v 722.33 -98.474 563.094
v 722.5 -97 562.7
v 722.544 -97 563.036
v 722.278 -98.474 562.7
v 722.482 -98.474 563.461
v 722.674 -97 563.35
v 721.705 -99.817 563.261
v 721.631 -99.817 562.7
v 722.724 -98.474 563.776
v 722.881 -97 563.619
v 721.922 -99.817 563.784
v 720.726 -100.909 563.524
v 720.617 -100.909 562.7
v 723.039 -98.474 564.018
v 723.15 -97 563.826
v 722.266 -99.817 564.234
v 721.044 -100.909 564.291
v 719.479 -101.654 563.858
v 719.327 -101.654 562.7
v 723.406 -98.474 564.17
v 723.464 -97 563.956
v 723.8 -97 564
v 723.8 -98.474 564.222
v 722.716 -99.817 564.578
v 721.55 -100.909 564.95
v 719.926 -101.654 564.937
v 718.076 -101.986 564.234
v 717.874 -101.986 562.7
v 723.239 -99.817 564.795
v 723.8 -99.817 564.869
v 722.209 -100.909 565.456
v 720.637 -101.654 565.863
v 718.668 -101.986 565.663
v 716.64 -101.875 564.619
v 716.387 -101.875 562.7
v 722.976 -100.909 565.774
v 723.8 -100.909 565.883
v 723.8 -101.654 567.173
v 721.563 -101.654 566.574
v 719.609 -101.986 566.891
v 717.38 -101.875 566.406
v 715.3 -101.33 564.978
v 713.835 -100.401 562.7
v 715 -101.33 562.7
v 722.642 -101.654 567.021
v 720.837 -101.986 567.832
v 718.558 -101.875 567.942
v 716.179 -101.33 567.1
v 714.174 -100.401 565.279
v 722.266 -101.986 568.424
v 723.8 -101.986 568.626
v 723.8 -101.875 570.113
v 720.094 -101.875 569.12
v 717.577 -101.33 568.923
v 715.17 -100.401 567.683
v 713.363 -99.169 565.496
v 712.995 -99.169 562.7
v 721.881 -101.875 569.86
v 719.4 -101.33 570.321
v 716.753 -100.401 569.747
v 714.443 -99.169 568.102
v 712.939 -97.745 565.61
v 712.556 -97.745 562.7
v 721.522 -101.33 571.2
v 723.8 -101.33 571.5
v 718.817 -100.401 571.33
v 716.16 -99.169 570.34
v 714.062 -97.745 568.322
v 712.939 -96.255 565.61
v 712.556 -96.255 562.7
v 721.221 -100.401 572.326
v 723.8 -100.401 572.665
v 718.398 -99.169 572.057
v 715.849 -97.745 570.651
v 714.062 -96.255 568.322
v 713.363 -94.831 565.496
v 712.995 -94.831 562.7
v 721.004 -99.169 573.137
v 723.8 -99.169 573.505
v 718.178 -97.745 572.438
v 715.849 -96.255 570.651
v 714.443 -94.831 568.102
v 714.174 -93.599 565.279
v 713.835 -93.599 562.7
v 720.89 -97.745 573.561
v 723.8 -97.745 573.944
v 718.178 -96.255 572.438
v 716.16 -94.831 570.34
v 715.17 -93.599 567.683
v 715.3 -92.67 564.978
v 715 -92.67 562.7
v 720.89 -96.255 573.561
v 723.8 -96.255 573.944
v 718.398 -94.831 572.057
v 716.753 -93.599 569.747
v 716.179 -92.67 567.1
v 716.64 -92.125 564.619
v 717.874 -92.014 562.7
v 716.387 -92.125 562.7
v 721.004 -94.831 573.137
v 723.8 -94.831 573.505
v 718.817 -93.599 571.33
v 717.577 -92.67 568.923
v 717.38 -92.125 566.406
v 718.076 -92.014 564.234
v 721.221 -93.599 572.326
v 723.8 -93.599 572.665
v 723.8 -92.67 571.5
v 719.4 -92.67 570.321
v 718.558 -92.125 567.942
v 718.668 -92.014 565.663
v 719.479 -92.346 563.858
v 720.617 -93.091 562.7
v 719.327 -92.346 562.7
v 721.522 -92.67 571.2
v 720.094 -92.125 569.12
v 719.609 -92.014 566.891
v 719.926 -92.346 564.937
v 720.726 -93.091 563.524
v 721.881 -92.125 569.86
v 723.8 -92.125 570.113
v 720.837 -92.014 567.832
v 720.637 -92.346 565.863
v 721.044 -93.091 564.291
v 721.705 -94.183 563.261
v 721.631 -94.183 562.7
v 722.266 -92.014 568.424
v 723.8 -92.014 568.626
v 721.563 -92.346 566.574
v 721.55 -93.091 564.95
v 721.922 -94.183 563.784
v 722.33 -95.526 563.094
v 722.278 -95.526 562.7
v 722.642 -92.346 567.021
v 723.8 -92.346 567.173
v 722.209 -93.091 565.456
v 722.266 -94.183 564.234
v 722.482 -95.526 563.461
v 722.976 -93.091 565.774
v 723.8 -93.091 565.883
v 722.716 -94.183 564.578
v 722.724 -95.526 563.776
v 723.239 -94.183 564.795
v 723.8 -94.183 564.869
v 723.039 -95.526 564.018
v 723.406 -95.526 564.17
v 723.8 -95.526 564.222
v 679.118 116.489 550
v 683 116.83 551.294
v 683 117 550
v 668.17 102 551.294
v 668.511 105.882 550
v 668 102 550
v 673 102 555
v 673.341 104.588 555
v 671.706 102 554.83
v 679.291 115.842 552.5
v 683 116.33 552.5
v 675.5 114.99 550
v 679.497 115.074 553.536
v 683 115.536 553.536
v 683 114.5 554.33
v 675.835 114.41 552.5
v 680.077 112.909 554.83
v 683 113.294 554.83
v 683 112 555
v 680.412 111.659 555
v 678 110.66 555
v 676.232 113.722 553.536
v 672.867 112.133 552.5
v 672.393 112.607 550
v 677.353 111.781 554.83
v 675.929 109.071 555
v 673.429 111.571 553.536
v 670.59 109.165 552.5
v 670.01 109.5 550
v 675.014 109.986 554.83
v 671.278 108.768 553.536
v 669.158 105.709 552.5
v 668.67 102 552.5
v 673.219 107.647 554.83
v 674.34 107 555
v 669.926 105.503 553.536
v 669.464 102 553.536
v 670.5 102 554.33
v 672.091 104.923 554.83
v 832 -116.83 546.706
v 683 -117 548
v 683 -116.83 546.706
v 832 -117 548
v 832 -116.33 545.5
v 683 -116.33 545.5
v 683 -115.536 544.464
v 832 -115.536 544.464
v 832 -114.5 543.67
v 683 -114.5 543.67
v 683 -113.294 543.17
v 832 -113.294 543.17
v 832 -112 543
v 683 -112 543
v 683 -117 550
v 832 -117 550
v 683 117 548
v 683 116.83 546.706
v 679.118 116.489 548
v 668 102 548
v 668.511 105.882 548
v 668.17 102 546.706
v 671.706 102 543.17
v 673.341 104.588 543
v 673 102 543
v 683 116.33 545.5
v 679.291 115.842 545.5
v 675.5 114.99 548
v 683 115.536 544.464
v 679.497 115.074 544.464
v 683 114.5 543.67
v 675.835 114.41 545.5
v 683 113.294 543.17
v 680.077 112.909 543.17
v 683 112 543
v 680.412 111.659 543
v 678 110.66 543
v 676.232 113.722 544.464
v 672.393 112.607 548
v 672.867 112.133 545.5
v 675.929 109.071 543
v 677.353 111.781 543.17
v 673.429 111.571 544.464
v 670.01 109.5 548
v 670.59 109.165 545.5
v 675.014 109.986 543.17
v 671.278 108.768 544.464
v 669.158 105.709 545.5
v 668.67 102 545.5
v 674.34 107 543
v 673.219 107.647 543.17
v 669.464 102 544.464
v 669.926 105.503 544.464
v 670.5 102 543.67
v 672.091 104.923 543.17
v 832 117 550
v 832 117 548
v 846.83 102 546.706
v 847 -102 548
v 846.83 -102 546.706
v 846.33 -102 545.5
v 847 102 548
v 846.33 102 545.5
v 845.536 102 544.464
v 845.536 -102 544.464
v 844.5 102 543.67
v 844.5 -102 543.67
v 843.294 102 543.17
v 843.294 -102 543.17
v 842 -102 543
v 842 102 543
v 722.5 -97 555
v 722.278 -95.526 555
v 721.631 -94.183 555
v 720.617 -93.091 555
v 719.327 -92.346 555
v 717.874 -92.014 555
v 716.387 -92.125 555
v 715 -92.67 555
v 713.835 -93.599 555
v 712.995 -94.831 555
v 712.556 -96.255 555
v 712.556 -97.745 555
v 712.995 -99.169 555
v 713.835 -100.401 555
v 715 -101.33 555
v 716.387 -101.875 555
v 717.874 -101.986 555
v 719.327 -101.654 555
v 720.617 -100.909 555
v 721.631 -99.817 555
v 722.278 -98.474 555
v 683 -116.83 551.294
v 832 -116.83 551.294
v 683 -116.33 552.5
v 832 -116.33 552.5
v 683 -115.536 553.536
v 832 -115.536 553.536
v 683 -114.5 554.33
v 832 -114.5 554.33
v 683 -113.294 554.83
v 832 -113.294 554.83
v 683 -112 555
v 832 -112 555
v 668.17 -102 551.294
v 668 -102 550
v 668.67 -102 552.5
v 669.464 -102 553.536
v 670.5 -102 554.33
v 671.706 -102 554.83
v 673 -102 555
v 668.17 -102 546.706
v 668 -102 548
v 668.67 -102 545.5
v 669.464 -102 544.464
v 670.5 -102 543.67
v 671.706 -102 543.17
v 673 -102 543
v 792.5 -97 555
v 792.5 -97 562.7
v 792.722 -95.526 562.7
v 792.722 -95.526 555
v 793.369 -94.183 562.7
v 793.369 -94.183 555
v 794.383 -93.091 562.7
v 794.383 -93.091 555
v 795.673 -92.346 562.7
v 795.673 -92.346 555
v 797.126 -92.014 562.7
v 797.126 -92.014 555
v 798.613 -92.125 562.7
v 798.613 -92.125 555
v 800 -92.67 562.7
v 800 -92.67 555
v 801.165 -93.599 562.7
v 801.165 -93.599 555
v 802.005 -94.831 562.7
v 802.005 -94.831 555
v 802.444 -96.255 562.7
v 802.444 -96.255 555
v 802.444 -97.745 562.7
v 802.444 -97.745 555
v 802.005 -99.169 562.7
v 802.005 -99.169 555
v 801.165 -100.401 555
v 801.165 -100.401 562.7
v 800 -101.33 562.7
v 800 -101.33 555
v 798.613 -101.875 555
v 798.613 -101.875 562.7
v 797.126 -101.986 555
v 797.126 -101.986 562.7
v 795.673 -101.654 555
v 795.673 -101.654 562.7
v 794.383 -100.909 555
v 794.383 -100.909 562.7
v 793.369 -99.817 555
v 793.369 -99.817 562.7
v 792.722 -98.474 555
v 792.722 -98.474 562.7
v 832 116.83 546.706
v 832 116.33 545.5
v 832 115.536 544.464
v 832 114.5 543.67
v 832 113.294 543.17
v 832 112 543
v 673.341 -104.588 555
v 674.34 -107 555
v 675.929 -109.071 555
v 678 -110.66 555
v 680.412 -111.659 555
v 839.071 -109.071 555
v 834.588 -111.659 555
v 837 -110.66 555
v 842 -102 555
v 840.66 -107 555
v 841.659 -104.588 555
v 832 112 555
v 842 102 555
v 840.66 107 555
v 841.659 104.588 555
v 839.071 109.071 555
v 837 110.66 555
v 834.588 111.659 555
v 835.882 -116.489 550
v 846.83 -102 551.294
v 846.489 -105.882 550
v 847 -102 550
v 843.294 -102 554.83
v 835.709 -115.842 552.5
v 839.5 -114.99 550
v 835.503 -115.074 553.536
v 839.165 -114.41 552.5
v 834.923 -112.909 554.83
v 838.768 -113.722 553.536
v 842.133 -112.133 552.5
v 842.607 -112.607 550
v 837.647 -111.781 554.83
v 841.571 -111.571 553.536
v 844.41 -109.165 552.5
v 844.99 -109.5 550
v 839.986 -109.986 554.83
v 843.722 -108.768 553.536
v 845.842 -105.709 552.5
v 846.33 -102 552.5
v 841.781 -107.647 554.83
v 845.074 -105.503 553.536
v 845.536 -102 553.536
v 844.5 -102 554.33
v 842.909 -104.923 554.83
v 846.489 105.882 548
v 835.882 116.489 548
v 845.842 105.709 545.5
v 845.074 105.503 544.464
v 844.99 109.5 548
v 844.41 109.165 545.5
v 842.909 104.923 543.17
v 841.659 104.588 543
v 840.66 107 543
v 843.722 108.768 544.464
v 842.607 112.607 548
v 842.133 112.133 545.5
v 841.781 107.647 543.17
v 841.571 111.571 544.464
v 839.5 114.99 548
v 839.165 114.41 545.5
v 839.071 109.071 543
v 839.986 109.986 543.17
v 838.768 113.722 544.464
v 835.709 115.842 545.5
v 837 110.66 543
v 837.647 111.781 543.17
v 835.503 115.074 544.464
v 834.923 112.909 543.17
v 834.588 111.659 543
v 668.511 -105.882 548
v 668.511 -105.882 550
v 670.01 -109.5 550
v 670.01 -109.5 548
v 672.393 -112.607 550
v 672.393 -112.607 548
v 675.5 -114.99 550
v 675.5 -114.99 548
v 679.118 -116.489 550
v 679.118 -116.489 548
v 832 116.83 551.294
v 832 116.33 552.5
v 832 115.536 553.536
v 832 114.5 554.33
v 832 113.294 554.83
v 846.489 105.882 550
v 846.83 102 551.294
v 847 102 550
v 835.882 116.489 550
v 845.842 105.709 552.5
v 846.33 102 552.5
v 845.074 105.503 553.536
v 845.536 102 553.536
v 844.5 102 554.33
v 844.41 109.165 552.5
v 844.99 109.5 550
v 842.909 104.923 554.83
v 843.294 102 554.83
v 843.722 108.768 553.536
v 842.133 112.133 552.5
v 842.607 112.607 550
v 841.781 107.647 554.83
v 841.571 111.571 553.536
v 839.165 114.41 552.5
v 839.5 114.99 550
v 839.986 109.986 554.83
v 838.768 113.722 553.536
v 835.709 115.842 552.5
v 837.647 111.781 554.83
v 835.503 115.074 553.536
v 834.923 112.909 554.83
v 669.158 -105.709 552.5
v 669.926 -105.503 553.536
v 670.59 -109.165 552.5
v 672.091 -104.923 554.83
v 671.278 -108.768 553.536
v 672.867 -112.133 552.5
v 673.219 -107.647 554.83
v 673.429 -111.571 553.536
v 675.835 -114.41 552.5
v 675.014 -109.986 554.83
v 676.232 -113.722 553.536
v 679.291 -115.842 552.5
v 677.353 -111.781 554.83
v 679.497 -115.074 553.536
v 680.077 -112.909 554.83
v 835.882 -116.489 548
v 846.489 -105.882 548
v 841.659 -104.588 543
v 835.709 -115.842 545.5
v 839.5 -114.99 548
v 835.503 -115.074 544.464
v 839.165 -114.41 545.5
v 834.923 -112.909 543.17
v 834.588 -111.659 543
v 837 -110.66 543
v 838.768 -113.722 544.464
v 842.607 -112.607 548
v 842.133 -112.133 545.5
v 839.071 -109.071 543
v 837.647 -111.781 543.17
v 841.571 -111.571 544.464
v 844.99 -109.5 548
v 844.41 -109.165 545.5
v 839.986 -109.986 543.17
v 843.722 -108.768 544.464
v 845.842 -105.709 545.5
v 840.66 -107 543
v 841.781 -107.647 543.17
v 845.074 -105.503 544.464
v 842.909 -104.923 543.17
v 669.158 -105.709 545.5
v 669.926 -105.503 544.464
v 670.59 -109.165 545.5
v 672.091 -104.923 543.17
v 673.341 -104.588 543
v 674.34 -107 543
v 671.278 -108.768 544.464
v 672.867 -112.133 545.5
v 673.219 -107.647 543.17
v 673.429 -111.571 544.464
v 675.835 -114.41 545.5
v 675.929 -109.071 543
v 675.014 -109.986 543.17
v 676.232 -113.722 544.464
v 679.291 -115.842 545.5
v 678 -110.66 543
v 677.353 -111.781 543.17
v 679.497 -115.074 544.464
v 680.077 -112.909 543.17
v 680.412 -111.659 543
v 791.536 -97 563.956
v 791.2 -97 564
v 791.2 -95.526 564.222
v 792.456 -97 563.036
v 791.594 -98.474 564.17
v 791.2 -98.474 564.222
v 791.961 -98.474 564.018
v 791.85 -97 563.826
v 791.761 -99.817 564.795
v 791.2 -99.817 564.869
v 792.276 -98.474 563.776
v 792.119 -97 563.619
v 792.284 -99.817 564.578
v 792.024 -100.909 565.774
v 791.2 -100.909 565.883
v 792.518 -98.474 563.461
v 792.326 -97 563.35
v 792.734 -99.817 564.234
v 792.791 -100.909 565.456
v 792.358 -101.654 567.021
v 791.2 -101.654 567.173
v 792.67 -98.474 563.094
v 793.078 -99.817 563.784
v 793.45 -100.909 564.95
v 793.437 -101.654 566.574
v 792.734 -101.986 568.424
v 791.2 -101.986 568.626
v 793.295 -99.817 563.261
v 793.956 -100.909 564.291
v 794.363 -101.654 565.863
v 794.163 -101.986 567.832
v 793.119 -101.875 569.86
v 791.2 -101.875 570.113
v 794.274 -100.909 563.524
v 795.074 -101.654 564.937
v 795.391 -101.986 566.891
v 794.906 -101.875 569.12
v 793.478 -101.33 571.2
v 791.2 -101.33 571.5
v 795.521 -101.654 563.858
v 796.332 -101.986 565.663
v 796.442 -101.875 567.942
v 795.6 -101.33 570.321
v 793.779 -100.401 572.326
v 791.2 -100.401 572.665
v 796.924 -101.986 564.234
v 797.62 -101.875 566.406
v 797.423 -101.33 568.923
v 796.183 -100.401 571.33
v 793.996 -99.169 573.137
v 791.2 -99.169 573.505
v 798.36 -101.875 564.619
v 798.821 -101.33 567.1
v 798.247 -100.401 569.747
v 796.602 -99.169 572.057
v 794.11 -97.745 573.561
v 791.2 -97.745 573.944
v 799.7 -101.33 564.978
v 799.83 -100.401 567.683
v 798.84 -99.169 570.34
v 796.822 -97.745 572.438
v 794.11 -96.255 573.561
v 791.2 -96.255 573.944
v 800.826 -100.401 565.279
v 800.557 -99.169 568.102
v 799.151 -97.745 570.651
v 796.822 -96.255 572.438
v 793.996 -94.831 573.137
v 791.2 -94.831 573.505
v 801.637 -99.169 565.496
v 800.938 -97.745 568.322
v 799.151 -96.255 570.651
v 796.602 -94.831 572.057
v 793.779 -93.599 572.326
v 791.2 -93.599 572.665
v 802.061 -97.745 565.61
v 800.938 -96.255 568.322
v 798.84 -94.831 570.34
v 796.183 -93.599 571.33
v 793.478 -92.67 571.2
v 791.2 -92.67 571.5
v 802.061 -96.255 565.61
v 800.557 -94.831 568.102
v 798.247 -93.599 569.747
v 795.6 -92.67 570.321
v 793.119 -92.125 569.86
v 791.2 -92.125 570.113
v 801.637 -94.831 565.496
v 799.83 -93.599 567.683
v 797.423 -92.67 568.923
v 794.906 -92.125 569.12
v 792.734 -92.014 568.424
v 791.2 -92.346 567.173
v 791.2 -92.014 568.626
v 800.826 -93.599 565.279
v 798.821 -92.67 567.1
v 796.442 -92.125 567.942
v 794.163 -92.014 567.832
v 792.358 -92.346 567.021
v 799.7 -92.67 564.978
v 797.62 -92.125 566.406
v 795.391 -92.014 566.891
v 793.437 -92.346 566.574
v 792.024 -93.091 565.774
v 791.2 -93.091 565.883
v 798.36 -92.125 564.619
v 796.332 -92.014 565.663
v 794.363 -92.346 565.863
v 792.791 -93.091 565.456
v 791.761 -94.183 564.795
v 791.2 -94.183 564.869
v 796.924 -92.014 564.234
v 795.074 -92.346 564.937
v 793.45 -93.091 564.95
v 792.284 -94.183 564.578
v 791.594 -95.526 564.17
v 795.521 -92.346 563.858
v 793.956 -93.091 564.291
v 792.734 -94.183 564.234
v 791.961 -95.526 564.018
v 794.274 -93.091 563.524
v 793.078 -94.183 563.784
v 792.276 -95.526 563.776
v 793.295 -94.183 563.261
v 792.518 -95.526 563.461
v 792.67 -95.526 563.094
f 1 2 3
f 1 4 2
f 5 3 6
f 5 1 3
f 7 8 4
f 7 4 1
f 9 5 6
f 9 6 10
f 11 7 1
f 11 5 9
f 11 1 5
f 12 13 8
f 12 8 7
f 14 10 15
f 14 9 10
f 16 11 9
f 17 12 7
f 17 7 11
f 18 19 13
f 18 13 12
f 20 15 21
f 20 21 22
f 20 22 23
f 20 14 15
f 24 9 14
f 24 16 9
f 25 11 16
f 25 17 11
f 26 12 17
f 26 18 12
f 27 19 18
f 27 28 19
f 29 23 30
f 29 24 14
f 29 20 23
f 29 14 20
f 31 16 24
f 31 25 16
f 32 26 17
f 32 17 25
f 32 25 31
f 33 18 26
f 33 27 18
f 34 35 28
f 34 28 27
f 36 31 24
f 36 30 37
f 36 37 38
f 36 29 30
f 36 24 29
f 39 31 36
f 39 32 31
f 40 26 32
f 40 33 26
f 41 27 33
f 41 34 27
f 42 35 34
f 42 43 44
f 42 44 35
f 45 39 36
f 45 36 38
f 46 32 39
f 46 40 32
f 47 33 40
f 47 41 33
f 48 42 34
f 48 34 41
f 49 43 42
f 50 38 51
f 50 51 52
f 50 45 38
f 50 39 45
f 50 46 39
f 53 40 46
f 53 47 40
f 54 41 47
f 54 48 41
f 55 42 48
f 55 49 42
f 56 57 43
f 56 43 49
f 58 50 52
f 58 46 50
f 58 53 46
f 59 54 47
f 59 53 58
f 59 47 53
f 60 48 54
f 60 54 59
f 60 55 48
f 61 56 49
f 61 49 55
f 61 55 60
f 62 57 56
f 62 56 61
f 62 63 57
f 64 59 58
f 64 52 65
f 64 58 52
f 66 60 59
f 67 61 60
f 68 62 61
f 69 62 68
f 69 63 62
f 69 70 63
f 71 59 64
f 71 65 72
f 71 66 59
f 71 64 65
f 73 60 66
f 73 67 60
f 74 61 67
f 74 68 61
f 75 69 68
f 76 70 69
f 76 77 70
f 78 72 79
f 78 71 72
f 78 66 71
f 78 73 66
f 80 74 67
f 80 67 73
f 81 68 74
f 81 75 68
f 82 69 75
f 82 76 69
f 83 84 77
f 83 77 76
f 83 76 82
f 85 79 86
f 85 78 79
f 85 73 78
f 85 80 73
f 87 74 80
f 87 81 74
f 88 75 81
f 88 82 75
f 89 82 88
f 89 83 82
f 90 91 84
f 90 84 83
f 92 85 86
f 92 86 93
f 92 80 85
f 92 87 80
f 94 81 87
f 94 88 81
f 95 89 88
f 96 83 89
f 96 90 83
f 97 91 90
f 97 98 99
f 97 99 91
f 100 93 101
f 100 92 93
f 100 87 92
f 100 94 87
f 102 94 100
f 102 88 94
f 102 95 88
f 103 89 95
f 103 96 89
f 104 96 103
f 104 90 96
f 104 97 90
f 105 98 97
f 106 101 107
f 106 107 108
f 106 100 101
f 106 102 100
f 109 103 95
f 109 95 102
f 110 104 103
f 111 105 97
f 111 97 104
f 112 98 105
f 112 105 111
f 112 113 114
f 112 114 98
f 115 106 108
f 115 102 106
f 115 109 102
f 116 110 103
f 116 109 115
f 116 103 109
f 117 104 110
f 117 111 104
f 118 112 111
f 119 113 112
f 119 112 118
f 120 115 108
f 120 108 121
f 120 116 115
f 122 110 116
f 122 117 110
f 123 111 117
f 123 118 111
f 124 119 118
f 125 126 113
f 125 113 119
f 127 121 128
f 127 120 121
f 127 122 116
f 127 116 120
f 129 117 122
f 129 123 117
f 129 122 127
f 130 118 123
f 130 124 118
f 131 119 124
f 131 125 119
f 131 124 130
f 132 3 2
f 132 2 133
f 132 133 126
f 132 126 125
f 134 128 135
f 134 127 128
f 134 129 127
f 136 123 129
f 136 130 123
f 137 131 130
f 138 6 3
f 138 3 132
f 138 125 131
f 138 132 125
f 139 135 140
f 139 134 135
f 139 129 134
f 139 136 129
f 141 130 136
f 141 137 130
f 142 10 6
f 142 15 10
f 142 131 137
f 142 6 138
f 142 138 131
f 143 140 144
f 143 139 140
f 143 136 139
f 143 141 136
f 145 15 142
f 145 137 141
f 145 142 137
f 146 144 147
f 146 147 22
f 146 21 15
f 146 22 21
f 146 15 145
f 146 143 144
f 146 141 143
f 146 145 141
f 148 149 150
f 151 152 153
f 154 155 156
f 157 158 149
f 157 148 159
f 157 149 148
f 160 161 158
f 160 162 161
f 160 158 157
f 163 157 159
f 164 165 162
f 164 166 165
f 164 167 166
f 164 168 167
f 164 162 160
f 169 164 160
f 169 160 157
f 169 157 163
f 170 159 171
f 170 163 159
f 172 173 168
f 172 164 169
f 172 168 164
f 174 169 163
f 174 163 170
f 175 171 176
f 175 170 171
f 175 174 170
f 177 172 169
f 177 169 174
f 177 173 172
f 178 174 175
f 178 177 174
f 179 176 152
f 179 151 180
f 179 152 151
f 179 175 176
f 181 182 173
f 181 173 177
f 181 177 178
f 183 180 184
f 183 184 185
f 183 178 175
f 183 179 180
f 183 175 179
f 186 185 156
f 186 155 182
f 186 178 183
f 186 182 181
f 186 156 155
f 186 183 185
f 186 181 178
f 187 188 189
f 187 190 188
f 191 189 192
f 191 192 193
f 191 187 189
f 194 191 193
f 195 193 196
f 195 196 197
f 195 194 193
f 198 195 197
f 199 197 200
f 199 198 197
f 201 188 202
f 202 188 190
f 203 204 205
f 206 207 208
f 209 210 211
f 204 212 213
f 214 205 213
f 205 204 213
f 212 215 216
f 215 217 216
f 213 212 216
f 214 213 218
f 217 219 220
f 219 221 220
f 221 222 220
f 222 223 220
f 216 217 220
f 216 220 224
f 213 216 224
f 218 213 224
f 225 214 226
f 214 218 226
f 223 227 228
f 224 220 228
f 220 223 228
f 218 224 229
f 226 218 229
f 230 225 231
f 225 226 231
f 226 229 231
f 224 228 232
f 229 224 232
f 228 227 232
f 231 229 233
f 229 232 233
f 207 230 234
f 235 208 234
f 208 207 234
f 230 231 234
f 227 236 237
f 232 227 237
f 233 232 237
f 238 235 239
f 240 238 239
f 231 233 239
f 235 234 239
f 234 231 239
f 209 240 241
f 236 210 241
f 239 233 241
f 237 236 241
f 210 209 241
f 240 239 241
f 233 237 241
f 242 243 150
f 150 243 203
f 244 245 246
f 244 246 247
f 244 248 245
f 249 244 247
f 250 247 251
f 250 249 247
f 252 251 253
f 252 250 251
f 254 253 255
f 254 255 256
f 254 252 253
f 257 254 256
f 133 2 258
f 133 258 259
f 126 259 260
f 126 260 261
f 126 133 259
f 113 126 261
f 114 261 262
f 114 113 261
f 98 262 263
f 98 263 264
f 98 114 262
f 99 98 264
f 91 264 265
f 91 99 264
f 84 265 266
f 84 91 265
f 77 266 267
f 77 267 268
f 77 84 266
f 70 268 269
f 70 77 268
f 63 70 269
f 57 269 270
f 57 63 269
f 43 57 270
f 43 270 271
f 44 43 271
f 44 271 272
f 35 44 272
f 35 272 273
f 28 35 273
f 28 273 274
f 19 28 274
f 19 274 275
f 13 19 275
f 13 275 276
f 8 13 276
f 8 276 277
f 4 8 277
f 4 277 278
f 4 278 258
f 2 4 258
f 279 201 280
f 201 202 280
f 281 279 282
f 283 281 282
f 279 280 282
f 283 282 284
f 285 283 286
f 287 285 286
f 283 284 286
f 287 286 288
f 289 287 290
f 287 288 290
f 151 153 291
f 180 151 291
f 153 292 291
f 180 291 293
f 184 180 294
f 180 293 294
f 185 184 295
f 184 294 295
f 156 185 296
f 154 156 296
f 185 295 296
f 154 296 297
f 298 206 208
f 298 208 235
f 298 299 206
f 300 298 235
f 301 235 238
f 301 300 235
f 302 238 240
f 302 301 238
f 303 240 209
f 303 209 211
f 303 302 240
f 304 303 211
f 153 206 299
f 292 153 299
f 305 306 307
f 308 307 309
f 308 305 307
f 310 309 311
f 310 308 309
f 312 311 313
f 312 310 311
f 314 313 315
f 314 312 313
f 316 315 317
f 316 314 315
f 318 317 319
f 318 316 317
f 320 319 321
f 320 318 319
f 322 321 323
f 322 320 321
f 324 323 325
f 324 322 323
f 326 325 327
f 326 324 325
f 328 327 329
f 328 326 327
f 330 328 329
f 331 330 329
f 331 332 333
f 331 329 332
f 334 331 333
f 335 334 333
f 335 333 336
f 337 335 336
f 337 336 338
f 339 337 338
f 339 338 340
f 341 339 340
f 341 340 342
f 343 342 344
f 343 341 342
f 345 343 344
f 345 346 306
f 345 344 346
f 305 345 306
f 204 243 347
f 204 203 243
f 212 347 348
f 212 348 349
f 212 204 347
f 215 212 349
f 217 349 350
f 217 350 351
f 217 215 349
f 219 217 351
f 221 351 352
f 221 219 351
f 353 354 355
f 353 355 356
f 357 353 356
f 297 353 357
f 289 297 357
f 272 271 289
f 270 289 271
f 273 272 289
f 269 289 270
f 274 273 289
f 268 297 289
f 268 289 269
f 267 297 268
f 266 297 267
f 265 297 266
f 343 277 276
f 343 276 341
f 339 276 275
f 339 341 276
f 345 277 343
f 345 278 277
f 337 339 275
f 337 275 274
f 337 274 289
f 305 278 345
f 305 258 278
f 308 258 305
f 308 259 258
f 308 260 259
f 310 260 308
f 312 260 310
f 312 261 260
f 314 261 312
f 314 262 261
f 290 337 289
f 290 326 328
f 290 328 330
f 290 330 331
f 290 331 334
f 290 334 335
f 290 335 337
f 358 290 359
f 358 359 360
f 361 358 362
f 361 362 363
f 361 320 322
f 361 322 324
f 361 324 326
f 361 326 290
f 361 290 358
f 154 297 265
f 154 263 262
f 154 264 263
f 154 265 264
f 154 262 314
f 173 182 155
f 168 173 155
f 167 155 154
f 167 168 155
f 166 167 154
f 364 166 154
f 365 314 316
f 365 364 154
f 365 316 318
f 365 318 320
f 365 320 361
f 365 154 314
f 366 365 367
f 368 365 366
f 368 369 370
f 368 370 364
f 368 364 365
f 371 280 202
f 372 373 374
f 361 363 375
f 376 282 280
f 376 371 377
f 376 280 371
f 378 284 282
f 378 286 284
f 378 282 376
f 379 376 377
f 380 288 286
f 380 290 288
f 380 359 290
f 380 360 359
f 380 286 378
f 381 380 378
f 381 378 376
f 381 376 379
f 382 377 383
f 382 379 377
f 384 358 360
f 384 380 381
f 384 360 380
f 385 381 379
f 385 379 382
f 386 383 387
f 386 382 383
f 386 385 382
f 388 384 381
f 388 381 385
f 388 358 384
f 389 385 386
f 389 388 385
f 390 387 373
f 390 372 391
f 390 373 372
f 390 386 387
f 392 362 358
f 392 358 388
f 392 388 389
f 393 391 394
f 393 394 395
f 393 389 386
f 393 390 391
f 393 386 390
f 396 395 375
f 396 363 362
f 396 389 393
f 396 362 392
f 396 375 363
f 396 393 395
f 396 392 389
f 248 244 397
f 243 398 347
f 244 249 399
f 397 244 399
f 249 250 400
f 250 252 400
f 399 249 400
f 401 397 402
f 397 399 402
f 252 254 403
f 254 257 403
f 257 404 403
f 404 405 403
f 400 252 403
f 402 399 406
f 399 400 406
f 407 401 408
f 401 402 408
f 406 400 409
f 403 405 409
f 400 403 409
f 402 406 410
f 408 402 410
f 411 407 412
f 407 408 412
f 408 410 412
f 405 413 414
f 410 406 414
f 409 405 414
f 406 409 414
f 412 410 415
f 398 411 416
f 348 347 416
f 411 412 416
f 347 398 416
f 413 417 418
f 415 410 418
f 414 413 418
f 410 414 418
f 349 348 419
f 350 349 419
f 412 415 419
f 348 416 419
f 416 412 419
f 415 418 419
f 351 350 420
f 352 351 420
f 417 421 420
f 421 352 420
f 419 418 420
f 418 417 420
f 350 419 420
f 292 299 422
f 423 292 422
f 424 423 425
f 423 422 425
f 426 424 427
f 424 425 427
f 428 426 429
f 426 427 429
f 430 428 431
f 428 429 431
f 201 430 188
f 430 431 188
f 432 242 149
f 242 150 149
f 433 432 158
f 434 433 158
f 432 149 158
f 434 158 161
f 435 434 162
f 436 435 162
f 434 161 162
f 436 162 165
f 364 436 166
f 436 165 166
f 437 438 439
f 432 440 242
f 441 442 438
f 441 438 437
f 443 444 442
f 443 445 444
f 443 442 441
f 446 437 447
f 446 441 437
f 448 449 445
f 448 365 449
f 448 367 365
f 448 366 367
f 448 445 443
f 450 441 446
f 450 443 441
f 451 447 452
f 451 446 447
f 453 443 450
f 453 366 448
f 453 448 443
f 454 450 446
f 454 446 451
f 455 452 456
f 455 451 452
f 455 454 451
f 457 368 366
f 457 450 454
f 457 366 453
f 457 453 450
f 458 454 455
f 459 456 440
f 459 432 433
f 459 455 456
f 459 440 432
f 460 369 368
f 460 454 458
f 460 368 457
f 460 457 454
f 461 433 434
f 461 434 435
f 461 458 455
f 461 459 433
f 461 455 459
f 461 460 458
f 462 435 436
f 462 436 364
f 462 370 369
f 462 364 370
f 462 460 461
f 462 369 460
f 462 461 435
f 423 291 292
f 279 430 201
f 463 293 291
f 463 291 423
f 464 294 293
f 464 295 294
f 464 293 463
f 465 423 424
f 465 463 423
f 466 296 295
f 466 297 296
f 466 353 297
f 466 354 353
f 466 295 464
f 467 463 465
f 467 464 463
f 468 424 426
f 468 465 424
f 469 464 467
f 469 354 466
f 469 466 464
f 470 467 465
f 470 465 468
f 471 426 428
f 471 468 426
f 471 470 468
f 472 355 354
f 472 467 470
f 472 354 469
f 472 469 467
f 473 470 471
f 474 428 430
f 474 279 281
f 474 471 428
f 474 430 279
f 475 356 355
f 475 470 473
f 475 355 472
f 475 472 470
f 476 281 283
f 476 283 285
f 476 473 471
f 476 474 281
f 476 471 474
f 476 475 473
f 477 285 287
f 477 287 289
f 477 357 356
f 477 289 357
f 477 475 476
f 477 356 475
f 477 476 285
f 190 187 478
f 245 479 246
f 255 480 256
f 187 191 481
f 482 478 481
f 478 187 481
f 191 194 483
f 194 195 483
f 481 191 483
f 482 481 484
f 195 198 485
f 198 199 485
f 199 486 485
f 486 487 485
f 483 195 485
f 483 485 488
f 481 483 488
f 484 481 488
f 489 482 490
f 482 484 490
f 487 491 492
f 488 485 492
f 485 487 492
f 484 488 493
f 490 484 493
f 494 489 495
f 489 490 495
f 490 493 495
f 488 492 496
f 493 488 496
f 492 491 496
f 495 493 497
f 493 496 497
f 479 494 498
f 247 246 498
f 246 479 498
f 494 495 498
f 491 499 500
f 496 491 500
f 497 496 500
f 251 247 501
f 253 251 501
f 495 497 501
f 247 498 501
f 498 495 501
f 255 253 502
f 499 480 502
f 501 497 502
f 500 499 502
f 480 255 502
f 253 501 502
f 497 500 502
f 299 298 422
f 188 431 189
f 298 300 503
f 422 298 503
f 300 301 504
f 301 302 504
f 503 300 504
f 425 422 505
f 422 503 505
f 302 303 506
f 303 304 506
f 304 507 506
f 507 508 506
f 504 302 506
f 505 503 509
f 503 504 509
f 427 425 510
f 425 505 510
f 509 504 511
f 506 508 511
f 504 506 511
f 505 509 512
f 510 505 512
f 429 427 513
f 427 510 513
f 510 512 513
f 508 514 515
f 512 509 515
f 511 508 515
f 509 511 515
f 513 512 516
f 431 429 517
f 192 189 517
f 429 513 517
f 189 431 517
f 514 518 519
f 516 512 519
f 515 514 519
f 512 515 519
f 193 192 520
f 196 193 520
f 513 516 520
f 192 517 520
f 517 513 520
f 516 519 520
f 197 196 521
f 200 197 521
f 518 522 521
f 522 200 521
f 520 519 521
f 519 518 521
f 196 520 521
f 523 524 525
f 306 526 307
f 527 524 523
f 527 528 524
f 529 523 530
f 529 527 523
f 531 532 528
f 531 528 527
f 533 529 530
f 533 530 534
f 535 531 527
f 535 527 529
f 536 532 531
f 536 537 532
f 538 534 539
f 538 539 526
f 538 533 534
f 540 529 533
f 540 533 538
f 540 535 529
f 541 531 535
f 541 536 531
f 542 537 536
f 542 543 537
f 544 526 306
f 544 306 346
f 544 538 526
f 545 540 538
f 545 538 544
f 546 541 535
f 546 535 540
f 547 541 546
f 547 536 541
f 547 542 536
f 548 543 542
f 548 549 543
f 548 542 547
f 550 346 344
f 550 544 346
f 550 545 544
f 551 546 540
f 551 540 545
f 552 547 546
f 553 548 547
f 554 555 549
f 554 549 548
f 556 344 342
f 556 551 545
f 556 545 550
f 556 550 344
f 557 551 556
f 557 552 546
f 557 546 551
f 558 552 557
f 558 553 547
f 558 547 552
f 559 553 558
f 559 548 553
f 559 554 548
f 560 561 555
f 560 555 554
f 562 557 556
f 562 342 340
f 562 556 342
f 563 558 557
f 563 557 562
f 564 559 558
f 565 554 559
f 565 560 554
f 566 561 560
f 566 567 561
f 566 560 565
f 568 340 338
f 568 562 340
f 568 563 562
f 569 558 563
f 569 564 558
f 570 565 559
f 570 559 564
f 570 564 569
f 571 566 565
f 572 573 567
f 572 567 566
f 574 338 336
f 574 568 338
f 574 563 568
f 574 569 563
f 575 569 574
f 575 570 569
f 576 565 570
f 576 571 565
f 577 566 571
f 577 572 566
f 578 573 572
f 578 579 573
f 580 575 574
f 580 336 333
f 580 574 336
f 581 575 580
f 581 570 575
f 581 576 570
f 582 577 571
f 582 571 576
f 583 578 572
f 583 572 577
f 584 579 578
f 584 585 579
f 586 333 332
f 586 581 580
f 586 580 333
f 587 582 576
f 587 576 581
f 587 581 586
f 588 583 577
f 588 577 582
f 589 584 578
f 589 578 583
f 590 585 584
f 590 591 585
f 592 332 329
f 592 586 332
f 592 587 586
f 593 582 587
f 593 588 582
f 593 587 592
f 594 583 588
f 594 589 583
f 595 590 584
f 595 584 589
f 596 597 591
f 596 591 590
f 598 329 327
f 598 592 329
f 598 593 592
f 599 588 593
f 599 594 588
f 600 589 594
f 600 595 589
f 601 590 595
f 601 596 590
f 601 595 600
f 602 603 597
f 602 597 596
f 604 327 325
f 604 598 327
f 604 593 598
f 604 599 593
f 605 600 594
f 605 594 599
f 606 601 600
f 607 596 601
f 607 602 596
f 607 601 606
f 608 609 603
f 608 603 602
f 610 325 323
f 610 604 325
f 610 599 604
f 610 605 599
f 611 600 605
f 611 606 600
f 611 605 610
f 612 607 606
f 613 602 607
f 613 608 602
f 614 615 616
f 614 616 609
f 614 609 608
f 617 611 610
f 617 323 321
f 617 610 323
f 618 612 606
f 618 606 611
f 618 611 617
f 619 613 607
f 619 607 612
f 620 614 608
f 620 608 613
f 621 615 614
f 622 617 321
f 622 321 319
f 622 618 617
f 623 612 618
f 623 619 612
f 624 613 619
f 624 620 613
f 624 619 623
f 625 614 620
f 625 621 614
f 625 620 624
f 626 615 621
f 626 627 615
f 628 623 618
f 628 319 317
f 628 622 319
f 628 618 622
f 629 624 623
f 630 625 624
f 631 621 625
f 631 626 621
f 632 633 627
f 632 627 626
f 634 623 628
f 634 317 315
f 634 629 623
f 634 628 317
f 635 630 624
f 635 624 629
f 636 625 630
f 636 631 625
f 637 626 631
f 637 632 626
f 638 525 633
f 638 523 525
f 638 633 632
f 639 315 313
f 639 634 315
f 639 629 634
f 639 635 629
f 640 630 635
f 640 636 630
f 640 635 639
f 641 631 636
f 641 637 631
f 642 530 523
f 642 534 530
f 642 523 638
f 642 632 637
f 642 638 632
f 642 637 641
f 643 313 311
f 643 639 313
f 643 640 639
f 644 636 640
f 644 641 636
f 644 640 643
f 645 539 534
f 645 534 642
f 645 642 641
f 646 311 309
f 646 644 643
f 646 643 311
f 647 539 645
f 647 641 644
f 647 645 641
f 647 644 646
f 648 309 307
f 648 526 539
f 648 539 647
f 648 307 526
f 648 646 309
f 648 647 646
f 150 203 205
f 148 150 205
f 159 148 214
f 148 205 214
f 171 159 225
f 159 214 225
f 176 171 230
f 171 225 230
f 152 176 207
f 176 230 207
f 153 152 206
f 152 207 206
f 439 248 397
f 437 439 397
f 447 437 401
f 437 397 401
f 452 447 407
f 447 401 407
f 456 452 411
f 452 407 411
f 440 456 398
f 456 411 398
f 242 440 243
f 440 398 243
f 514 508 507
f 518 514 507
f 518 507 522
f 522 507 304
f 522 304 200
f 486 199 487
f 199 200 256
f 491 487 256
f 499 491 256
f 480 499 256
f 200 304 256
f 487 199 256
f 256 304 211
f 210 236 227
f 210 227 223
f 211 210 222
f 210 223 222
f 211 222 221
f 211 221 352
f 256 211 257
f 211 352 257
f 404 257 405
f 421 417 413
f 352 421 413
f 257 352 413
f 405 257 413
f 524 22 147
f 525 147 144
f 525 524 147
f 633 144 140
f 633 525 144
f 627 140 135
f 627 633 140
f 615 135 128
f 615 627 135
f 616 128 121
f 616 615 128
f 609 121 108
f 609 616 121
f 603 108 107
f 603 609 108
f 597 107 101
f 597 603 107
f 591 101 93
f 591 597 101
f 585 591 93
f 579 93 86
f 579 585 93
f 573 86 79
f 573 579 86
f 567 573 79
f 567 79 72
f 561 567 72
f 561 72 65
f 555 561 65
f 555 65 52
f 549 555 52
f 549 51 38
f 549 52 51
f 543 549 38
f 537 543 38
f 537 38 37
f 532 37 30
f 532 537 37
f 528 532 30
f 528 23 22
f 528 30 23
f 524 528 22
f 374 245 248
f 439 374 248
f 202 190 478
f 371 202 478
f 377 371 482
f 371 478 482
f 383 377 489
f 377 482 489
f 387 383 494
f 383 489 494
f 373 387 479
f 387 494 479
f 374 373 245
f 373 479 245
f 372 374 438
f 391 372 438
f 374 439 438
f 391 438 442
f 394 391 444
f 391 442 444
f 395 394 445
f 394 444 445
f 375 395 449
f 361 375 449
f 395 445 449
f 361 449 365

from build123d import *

# Parameters (mm, degrees)
BLOCK_START           = 543
BLOCK_1_DEPTH         = 12
BLOCK_EDGE_FILLET_1_R = 5
PIPE_1_PROFILE_R      = 5


with BuildPart() as part:
    # Block sketch 1 → Block 1 (new body)
    with BuildSketch(Plane.XY.offset(BLOCK_START)):
        with BuildLine():
            Line((683, -117), (832, -117))
            ThreePointArc((832, -117), (842.606601718, -112.606601718), (847, -102))
            Line((847, -102), (847, 102))
            ThreePointArc((847, 102), (842.606601718, 112.606601718), (832, 117))
            Line((832, 117), (683, 117))
            ThreePointArc((683, 117), (672.393398282, 112.606601718), (668, 102))
            Line((668, 102), (668, -102))
            ThreePointArc((668, -102), (672.393398282, -112.606601718), (683, -117))
        make_face()
    extrude(amount=BLOCK_1_DEPTH)

    # Block edge fillet 1
    block_edge_fillet_1_edges = [part.edges().sort_by_distance(p)[0] for p in [
        (847, 0, 543),
        (842.606601718, -112.606601718, 543),
        (757.5, -117, 543),
        (672.393398282, -112.606601718, 543),
        (842.606601718, -112.606601718, 555),
        (847, 0, 555),
        (842.606601718, 112.606601718, 555),
        (757.5, 117, 555),
        (672.393398282, 112.606601718, 555),
        (668, 0, 555),
        (672.393398282, -112.606601718, 555),
        (668, 0, 543),
        (757.5, -117, 555),
        (672.393398282, 112.606601718, 543),
        (757.5, 117, 543),
        (842.606601718, 112.606601718, 543),
    ]]
    fillet(block_edge_fillet_1_edges, radius=BLOCK_EDGE_FILLET_1_R)


with BuildPart() as body_2:
    # Pipe 1: sweep along a curve in space
    with BuildLine() as pipe_1_path:
        Line((717.5, -97, 555), (717.5, -97, 562.7))
        ThreePointArc((717.5, -97, 562.7), (719.345227279, -97, 567.154772721), (723.8, -97, 569))
        Line((723.8, -97, 569), (791.2, -97, 569))
        ThreePointArc((791.2, -97, 569), (795.654772721, -97, 567.154772721), (797.5, -97, 562.7))
        Line((797.5, -97, 562.7), (797.5, -97, 555))
    # Pipe 1 profile (on start of the path) → Pipe 1 (sweep)
    with BuildSketch(Plane(origin=(717.5, -97, 555), x_dir=(1, 0, 0), z_dir=(0, 0, 1))):
        Circle(PIPE_1_PROFILE_R)
    sweep(path=pipe_1_path.line)

    # Combine (weld / assembly of features): union part
    add(part.part)


solid = body_2.part
